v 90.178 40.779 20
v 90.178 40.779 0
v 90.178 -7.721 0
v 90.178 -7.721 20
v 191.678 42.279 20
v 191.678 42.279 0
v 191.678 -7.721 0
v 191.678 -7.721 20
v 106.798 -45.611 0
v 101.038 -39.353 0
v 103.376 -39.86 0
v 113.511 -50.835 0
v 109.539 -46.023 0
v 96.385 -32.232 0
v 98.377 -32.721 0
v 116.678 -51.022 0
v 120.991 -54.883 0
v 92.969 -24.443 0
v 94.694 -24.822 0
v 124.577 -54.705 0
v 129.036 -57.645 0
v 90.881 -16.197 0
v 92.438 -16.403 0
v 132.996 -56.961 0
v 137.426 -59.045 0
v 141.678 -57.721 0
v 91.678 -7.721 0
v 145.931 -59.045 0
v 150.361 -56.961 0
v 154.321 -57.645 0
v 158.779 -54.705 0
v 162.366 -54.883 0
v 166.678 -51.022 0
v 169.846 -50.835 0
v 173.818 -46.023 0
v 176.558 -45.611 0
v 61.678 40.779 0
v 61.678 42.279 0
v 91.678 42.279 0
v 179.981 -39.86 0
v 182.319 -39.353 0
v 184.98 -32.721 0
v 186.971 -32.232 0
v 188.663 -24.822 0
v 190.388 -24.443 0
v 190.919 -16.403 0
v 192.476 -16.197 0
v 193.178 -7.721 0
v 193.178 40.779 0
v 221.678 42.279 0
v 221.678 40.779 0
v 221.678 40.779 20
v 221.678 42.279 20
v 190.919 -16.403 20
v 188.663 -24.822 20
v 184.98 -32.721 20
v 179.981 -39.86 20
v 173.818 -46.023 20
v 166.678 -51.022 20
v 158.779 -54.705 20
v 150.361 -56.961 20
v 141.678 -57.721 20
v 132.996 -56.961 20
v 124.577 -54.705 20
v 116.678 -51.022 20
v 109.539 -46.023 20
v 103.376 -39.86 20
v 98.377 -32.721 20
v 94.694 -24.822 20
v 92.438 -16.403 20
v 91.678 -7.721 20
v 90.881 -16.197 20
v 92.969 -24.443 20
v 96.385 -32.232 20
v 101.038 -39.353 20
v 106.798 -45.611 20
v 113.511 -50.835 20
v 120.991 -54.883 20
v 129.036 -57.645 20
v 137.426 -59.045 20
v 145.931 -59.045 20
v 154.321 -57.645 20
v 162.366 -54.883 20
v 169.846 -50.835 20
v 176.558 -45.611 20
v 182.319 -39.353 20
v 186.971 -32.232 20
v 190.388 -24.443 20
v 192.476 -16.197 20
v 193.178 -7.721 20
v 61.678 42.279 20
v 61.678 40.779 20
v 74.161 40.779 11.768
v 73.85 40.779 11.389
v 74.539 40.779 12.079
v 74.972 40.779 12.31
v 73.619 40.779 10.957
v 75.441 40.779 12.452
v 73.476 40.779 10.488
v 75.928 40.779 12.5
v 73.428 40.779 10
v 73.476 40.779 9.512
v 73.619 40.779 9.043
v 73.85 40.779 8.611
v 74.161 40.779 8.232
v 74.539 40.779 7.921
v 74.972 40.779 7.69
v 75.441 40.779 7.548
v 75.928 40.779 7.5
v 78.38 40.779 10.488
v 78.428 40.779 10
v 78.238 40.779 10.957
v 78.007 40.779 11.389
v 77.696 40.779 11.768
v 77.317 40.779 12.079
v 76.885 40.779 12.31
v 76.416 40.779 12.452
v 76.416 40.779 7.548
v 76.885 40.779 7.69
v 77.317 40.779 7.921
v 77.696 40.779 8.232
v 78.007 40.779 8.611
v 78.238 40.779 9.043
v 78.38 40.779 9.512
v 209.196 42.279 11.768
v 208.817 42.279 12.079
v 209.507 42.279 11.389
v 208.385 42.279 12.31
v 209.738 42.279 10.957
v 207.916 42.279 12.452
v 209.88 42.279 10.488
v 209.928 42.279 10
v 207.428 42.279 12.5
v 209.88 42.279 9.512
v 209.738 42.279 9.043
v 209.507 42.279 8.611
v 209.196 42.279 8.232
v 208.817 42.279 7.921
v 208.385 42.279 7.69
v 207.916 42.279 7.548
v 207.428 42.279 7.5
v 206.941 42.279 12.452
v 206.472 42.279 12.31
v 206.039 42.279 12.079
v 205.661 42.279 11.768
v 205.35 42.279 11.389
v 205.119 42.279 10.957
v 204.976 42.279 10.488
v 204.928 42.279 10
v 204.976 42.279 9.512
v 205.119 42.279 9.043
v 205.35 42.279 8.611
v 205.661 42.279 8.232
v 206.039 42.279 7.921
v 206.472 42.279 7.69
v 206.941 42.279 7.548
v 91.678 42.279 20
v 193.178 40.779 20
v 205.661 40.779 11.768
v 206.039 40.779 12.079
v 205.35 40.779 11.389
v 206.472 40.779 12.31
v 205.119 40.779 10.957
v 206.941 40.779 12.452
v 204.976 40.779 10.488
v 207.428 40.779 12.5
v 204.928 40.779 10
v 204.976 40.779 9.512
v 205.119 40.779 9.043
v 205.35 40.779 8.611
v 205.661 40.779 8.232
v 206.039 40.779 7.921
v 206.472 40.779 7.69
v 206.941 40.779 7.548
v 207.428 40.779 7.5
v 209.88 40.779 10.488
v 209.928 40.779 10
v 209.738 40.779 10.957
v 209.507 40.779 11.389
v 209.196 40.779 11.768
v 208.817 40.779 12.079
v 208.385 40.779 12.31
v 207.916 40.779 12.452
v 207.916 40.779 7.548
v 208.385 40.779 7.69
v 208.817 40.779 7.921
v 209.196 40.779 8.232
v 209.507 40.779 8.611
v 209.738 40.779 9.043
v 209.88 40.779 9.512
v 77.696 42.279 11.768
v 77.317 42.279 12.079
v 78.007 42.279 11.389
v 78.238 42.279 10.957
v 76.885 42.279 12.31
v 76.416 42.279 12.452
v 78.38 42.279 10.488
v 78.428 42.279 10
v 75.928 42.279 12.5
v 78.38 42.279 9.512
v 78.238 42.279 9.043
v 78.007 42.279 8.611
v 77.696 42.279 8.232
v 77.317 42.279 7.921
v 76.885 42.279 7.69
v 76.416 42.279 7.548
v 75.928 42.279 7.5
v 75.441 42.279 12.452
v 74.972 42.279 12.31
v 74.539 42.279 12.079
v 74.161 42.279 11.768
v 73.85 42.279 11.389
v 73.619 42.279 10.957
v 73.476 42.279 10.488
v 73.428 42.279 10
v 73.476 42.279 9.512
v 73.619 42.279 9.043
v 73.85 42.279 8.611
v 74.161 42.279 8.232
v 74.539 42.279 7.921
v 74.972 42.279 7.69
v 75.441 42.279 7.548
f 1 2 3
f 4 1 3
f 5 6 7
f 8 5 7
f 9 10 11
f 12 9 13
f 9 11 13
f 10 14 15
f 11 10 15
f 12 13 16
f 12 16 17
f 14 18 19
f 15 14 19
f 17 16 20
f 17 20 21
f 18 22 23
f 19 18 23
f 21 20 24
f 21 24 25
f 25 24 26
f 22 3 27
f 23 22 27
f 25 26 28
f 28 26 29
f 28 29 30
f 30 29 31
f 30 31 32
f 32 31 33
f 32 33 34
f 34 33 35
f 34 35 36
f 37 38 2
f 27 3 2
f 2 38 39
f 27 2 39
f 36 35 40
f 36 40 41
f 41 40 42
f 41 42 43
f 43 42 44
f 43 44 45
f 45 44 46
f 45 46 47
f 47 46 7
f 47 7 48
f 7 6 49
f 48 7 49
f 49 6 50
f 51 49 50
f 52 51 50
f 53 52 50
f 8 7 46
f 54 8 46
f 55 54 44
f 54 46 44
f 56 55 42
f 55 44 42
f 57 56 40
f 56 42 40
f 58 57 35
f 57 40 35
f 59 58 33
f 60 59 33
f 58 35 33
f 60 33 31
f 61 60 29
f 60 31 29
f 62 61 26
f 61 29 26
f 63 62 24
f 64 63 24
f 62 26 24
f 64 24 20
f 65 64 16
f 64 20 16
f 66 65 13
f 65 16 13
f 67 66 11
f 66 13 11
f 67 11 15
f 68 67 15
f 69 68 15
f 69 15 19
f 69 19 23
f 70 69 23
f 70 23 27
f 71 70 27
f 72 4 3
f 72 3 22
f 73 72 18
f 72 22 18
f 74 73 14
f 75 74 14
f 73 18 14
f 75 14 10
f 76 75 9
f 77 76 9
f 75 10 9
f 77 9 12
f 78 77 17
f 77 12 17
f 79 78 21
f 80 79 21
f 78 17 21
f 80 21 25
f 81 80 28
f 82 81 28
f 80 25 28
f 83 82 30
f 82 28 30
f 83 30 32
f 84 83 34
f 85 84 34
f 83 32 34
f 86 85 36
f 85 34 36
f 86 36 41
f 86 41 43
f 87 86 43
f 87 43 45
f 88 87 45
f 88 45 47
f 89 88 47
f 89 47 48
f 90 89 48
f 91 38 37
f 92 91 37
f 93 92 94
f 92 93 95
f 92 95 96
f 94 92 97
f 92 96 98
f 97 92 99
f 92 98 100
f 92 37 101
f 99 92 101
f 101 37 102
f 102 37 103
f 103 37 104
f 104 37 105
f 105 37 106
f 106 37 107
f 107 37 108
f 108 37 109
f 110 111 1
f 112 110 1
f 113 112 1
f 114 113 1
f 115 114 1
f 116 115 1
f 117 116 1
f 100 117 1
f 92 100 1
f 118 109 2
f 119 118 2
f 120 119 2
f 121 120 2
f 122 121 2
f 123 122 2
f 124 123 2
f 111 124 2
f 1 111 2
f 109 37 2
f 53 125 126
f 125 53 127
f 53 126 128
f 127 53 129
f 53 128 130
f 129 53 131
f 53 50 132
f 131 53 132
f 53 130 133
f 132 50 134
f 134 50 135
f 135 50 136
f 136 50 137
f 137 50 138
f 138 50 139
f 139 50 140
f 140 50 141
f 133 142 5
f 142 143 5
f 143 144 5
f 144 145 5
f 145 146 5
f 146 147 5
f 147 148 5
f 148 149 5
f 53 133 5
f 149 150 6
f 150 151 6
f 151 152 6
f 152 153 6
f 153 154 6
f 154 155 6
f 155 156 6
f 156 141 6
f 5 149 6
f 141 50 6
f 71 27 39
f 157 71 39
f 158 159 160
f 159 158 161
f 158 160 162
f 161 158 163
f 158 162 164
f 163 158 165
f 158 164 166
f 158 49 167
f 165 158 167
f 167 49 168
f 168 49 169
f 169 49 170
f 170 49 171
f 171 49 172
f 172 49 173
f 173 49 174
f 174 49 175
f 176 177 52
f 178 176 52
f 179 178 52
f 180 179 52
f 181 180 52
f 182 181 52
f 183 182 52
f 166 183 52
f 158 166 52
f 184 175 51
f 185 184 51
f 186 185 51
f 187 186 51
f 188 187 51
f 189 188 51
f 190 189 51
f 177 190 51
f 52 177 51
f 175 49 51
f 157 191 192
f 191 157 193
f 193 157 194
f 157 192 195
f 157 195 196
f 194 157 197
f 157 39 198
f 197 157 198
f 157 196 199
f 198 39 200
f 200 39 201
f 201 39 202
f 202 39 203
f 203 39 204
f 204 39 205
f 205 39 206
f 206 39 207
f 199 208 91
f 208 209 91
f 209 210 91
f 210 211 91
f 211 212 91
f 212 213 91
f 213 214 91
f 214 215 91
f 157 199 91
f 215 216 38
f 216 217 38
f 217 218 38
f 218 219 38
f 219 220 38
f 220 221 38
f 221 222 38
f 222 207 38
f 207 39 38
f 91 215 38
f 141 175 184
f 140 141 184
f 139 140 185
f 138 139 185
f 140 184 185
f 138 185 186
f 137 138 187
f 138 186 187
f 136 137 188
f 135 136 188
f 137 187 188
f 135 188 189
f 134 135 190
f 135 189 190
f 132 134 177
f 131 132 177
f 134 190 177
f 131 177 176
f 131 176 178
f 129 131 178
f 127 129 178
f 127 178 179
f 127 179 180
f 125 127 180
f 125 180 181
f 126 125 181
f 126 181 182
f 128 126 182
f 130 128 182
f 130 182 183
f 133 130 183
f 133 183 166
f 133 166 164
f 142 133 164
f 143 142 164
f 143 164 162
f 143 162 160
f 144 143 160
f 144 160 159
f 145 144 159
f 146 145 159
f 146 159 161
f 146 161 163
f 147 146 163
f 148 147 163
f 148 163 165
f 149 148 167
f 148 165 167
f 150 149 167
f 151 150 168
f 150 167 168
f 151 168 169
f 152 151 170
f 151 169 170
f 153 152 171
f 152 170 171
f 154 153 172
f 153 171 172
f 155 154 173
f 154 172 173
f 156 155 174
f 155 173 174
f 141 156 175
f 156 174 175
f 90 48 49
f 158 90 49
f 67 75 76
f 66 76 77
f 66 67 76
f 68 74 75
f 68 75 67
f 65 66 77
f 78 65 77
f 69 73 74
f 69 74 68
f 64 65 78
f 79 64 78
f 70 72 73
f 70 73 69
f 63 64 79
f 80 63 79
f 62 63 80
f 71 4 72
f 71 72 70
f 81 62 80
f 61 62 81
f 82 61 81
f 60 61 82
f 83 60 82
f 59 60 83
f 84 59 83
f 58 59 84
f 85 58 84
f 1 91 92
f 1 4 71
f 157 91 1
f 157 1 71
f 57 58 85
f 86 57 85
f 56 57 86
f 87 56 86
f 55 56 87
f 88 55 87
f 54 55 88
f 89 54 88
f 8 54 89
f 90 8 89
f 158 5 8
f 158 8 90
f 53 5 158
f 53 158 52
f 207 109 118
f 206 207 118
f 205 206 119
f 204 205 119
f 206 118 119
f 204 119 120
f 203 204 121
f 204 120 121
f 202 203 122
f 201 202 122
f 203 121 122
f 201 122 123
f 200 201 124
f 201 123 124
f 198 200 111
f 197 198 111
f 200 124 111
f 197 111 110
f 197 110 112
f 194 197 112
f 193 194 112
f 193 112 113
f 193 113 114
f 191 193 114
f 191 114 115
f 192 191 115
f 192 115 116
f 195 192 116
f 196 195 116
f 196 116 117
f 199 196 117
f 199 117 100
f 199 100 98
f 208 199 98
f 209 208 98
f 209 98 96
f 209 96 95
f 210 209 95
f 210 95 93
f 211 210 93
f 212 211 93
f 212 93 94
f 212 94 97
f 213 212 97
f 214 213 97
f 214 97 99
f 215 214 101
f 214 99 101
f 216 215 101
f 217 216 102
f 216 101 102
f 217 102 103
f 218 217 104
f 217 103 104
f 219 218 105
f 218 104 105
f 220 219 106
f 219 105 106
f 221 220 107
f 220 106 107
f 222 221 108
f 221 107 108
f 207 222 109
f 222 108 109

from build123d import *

# Parameters (mm, degrees)
RESSALTO_EXTRUS_O1_DEPTH = 20
ESBO_O2_R                = 2.5
CORTE_EXTRUS_O2_DEPTH    = 2


with BuildPart() as part:
    # Esboço1 → Ressalto-extrusão1 (new body)
    with BuildSketch(Plane.XY):
        with BuildLine():
            Line((191.678372413, 42.279236252), (191.678372413, -7.720763748))
            ThreePointArc((191.678372413, -7.720763748), (141.678372413, -57.720763748), (91.678372413, -7.720763748))
            Line((91.678372413, -7.720763748), (91.678372413, 42.279236252))
            Line((91.678372413, 42.279236252), (61.678372413, 42.279236252))
            Line((61.678372413, 42.279236252), (61.678372413, 40.779236252))
            Line((61.678372413, 40.779236252), (90.178372413, 40.779236252))
            Line((90.178372413, 40.779236252), (90.178372413, -7.720763748))
            ThreePointArc((90.178372413, -7.720763748), (141.678372413, -59.220763748), (193.178372413, -7.720763748))
            Line((193.178372413, -7.720763748), (193.178372413, 40.779236252))
            Line((193.178372413, 40.779236252), (221.678372413, 40.779236252))
            Line((221.678372413, 40.779236252), (221.678372413, 42.279236252))
            Line((221.678372413, 42.279236252), (191.678372413, 42.279236252))
        make_face()
    extrude(amount=RESSALTO_EXTRUS_O1_DEPTH)

    # Esboço2 → Corte-extrusão2 (cut)
    with BuildSketch(Plane.XZ.offset(-40.779236252)):
        with Locations(Location((75.928372413, 10, 0), (0, 0, 270))):
            Circle(ESBO_O2_R)
        with Locations(Location((207.428372413, 10, 0), (0, 0, 270))):
            Circle(ESBO_O2_R)
    extrude(amount=-CORTE_EXTRUS_O2_DEPTH, mode=Mode.SUBTRACT)


solid = part.part
